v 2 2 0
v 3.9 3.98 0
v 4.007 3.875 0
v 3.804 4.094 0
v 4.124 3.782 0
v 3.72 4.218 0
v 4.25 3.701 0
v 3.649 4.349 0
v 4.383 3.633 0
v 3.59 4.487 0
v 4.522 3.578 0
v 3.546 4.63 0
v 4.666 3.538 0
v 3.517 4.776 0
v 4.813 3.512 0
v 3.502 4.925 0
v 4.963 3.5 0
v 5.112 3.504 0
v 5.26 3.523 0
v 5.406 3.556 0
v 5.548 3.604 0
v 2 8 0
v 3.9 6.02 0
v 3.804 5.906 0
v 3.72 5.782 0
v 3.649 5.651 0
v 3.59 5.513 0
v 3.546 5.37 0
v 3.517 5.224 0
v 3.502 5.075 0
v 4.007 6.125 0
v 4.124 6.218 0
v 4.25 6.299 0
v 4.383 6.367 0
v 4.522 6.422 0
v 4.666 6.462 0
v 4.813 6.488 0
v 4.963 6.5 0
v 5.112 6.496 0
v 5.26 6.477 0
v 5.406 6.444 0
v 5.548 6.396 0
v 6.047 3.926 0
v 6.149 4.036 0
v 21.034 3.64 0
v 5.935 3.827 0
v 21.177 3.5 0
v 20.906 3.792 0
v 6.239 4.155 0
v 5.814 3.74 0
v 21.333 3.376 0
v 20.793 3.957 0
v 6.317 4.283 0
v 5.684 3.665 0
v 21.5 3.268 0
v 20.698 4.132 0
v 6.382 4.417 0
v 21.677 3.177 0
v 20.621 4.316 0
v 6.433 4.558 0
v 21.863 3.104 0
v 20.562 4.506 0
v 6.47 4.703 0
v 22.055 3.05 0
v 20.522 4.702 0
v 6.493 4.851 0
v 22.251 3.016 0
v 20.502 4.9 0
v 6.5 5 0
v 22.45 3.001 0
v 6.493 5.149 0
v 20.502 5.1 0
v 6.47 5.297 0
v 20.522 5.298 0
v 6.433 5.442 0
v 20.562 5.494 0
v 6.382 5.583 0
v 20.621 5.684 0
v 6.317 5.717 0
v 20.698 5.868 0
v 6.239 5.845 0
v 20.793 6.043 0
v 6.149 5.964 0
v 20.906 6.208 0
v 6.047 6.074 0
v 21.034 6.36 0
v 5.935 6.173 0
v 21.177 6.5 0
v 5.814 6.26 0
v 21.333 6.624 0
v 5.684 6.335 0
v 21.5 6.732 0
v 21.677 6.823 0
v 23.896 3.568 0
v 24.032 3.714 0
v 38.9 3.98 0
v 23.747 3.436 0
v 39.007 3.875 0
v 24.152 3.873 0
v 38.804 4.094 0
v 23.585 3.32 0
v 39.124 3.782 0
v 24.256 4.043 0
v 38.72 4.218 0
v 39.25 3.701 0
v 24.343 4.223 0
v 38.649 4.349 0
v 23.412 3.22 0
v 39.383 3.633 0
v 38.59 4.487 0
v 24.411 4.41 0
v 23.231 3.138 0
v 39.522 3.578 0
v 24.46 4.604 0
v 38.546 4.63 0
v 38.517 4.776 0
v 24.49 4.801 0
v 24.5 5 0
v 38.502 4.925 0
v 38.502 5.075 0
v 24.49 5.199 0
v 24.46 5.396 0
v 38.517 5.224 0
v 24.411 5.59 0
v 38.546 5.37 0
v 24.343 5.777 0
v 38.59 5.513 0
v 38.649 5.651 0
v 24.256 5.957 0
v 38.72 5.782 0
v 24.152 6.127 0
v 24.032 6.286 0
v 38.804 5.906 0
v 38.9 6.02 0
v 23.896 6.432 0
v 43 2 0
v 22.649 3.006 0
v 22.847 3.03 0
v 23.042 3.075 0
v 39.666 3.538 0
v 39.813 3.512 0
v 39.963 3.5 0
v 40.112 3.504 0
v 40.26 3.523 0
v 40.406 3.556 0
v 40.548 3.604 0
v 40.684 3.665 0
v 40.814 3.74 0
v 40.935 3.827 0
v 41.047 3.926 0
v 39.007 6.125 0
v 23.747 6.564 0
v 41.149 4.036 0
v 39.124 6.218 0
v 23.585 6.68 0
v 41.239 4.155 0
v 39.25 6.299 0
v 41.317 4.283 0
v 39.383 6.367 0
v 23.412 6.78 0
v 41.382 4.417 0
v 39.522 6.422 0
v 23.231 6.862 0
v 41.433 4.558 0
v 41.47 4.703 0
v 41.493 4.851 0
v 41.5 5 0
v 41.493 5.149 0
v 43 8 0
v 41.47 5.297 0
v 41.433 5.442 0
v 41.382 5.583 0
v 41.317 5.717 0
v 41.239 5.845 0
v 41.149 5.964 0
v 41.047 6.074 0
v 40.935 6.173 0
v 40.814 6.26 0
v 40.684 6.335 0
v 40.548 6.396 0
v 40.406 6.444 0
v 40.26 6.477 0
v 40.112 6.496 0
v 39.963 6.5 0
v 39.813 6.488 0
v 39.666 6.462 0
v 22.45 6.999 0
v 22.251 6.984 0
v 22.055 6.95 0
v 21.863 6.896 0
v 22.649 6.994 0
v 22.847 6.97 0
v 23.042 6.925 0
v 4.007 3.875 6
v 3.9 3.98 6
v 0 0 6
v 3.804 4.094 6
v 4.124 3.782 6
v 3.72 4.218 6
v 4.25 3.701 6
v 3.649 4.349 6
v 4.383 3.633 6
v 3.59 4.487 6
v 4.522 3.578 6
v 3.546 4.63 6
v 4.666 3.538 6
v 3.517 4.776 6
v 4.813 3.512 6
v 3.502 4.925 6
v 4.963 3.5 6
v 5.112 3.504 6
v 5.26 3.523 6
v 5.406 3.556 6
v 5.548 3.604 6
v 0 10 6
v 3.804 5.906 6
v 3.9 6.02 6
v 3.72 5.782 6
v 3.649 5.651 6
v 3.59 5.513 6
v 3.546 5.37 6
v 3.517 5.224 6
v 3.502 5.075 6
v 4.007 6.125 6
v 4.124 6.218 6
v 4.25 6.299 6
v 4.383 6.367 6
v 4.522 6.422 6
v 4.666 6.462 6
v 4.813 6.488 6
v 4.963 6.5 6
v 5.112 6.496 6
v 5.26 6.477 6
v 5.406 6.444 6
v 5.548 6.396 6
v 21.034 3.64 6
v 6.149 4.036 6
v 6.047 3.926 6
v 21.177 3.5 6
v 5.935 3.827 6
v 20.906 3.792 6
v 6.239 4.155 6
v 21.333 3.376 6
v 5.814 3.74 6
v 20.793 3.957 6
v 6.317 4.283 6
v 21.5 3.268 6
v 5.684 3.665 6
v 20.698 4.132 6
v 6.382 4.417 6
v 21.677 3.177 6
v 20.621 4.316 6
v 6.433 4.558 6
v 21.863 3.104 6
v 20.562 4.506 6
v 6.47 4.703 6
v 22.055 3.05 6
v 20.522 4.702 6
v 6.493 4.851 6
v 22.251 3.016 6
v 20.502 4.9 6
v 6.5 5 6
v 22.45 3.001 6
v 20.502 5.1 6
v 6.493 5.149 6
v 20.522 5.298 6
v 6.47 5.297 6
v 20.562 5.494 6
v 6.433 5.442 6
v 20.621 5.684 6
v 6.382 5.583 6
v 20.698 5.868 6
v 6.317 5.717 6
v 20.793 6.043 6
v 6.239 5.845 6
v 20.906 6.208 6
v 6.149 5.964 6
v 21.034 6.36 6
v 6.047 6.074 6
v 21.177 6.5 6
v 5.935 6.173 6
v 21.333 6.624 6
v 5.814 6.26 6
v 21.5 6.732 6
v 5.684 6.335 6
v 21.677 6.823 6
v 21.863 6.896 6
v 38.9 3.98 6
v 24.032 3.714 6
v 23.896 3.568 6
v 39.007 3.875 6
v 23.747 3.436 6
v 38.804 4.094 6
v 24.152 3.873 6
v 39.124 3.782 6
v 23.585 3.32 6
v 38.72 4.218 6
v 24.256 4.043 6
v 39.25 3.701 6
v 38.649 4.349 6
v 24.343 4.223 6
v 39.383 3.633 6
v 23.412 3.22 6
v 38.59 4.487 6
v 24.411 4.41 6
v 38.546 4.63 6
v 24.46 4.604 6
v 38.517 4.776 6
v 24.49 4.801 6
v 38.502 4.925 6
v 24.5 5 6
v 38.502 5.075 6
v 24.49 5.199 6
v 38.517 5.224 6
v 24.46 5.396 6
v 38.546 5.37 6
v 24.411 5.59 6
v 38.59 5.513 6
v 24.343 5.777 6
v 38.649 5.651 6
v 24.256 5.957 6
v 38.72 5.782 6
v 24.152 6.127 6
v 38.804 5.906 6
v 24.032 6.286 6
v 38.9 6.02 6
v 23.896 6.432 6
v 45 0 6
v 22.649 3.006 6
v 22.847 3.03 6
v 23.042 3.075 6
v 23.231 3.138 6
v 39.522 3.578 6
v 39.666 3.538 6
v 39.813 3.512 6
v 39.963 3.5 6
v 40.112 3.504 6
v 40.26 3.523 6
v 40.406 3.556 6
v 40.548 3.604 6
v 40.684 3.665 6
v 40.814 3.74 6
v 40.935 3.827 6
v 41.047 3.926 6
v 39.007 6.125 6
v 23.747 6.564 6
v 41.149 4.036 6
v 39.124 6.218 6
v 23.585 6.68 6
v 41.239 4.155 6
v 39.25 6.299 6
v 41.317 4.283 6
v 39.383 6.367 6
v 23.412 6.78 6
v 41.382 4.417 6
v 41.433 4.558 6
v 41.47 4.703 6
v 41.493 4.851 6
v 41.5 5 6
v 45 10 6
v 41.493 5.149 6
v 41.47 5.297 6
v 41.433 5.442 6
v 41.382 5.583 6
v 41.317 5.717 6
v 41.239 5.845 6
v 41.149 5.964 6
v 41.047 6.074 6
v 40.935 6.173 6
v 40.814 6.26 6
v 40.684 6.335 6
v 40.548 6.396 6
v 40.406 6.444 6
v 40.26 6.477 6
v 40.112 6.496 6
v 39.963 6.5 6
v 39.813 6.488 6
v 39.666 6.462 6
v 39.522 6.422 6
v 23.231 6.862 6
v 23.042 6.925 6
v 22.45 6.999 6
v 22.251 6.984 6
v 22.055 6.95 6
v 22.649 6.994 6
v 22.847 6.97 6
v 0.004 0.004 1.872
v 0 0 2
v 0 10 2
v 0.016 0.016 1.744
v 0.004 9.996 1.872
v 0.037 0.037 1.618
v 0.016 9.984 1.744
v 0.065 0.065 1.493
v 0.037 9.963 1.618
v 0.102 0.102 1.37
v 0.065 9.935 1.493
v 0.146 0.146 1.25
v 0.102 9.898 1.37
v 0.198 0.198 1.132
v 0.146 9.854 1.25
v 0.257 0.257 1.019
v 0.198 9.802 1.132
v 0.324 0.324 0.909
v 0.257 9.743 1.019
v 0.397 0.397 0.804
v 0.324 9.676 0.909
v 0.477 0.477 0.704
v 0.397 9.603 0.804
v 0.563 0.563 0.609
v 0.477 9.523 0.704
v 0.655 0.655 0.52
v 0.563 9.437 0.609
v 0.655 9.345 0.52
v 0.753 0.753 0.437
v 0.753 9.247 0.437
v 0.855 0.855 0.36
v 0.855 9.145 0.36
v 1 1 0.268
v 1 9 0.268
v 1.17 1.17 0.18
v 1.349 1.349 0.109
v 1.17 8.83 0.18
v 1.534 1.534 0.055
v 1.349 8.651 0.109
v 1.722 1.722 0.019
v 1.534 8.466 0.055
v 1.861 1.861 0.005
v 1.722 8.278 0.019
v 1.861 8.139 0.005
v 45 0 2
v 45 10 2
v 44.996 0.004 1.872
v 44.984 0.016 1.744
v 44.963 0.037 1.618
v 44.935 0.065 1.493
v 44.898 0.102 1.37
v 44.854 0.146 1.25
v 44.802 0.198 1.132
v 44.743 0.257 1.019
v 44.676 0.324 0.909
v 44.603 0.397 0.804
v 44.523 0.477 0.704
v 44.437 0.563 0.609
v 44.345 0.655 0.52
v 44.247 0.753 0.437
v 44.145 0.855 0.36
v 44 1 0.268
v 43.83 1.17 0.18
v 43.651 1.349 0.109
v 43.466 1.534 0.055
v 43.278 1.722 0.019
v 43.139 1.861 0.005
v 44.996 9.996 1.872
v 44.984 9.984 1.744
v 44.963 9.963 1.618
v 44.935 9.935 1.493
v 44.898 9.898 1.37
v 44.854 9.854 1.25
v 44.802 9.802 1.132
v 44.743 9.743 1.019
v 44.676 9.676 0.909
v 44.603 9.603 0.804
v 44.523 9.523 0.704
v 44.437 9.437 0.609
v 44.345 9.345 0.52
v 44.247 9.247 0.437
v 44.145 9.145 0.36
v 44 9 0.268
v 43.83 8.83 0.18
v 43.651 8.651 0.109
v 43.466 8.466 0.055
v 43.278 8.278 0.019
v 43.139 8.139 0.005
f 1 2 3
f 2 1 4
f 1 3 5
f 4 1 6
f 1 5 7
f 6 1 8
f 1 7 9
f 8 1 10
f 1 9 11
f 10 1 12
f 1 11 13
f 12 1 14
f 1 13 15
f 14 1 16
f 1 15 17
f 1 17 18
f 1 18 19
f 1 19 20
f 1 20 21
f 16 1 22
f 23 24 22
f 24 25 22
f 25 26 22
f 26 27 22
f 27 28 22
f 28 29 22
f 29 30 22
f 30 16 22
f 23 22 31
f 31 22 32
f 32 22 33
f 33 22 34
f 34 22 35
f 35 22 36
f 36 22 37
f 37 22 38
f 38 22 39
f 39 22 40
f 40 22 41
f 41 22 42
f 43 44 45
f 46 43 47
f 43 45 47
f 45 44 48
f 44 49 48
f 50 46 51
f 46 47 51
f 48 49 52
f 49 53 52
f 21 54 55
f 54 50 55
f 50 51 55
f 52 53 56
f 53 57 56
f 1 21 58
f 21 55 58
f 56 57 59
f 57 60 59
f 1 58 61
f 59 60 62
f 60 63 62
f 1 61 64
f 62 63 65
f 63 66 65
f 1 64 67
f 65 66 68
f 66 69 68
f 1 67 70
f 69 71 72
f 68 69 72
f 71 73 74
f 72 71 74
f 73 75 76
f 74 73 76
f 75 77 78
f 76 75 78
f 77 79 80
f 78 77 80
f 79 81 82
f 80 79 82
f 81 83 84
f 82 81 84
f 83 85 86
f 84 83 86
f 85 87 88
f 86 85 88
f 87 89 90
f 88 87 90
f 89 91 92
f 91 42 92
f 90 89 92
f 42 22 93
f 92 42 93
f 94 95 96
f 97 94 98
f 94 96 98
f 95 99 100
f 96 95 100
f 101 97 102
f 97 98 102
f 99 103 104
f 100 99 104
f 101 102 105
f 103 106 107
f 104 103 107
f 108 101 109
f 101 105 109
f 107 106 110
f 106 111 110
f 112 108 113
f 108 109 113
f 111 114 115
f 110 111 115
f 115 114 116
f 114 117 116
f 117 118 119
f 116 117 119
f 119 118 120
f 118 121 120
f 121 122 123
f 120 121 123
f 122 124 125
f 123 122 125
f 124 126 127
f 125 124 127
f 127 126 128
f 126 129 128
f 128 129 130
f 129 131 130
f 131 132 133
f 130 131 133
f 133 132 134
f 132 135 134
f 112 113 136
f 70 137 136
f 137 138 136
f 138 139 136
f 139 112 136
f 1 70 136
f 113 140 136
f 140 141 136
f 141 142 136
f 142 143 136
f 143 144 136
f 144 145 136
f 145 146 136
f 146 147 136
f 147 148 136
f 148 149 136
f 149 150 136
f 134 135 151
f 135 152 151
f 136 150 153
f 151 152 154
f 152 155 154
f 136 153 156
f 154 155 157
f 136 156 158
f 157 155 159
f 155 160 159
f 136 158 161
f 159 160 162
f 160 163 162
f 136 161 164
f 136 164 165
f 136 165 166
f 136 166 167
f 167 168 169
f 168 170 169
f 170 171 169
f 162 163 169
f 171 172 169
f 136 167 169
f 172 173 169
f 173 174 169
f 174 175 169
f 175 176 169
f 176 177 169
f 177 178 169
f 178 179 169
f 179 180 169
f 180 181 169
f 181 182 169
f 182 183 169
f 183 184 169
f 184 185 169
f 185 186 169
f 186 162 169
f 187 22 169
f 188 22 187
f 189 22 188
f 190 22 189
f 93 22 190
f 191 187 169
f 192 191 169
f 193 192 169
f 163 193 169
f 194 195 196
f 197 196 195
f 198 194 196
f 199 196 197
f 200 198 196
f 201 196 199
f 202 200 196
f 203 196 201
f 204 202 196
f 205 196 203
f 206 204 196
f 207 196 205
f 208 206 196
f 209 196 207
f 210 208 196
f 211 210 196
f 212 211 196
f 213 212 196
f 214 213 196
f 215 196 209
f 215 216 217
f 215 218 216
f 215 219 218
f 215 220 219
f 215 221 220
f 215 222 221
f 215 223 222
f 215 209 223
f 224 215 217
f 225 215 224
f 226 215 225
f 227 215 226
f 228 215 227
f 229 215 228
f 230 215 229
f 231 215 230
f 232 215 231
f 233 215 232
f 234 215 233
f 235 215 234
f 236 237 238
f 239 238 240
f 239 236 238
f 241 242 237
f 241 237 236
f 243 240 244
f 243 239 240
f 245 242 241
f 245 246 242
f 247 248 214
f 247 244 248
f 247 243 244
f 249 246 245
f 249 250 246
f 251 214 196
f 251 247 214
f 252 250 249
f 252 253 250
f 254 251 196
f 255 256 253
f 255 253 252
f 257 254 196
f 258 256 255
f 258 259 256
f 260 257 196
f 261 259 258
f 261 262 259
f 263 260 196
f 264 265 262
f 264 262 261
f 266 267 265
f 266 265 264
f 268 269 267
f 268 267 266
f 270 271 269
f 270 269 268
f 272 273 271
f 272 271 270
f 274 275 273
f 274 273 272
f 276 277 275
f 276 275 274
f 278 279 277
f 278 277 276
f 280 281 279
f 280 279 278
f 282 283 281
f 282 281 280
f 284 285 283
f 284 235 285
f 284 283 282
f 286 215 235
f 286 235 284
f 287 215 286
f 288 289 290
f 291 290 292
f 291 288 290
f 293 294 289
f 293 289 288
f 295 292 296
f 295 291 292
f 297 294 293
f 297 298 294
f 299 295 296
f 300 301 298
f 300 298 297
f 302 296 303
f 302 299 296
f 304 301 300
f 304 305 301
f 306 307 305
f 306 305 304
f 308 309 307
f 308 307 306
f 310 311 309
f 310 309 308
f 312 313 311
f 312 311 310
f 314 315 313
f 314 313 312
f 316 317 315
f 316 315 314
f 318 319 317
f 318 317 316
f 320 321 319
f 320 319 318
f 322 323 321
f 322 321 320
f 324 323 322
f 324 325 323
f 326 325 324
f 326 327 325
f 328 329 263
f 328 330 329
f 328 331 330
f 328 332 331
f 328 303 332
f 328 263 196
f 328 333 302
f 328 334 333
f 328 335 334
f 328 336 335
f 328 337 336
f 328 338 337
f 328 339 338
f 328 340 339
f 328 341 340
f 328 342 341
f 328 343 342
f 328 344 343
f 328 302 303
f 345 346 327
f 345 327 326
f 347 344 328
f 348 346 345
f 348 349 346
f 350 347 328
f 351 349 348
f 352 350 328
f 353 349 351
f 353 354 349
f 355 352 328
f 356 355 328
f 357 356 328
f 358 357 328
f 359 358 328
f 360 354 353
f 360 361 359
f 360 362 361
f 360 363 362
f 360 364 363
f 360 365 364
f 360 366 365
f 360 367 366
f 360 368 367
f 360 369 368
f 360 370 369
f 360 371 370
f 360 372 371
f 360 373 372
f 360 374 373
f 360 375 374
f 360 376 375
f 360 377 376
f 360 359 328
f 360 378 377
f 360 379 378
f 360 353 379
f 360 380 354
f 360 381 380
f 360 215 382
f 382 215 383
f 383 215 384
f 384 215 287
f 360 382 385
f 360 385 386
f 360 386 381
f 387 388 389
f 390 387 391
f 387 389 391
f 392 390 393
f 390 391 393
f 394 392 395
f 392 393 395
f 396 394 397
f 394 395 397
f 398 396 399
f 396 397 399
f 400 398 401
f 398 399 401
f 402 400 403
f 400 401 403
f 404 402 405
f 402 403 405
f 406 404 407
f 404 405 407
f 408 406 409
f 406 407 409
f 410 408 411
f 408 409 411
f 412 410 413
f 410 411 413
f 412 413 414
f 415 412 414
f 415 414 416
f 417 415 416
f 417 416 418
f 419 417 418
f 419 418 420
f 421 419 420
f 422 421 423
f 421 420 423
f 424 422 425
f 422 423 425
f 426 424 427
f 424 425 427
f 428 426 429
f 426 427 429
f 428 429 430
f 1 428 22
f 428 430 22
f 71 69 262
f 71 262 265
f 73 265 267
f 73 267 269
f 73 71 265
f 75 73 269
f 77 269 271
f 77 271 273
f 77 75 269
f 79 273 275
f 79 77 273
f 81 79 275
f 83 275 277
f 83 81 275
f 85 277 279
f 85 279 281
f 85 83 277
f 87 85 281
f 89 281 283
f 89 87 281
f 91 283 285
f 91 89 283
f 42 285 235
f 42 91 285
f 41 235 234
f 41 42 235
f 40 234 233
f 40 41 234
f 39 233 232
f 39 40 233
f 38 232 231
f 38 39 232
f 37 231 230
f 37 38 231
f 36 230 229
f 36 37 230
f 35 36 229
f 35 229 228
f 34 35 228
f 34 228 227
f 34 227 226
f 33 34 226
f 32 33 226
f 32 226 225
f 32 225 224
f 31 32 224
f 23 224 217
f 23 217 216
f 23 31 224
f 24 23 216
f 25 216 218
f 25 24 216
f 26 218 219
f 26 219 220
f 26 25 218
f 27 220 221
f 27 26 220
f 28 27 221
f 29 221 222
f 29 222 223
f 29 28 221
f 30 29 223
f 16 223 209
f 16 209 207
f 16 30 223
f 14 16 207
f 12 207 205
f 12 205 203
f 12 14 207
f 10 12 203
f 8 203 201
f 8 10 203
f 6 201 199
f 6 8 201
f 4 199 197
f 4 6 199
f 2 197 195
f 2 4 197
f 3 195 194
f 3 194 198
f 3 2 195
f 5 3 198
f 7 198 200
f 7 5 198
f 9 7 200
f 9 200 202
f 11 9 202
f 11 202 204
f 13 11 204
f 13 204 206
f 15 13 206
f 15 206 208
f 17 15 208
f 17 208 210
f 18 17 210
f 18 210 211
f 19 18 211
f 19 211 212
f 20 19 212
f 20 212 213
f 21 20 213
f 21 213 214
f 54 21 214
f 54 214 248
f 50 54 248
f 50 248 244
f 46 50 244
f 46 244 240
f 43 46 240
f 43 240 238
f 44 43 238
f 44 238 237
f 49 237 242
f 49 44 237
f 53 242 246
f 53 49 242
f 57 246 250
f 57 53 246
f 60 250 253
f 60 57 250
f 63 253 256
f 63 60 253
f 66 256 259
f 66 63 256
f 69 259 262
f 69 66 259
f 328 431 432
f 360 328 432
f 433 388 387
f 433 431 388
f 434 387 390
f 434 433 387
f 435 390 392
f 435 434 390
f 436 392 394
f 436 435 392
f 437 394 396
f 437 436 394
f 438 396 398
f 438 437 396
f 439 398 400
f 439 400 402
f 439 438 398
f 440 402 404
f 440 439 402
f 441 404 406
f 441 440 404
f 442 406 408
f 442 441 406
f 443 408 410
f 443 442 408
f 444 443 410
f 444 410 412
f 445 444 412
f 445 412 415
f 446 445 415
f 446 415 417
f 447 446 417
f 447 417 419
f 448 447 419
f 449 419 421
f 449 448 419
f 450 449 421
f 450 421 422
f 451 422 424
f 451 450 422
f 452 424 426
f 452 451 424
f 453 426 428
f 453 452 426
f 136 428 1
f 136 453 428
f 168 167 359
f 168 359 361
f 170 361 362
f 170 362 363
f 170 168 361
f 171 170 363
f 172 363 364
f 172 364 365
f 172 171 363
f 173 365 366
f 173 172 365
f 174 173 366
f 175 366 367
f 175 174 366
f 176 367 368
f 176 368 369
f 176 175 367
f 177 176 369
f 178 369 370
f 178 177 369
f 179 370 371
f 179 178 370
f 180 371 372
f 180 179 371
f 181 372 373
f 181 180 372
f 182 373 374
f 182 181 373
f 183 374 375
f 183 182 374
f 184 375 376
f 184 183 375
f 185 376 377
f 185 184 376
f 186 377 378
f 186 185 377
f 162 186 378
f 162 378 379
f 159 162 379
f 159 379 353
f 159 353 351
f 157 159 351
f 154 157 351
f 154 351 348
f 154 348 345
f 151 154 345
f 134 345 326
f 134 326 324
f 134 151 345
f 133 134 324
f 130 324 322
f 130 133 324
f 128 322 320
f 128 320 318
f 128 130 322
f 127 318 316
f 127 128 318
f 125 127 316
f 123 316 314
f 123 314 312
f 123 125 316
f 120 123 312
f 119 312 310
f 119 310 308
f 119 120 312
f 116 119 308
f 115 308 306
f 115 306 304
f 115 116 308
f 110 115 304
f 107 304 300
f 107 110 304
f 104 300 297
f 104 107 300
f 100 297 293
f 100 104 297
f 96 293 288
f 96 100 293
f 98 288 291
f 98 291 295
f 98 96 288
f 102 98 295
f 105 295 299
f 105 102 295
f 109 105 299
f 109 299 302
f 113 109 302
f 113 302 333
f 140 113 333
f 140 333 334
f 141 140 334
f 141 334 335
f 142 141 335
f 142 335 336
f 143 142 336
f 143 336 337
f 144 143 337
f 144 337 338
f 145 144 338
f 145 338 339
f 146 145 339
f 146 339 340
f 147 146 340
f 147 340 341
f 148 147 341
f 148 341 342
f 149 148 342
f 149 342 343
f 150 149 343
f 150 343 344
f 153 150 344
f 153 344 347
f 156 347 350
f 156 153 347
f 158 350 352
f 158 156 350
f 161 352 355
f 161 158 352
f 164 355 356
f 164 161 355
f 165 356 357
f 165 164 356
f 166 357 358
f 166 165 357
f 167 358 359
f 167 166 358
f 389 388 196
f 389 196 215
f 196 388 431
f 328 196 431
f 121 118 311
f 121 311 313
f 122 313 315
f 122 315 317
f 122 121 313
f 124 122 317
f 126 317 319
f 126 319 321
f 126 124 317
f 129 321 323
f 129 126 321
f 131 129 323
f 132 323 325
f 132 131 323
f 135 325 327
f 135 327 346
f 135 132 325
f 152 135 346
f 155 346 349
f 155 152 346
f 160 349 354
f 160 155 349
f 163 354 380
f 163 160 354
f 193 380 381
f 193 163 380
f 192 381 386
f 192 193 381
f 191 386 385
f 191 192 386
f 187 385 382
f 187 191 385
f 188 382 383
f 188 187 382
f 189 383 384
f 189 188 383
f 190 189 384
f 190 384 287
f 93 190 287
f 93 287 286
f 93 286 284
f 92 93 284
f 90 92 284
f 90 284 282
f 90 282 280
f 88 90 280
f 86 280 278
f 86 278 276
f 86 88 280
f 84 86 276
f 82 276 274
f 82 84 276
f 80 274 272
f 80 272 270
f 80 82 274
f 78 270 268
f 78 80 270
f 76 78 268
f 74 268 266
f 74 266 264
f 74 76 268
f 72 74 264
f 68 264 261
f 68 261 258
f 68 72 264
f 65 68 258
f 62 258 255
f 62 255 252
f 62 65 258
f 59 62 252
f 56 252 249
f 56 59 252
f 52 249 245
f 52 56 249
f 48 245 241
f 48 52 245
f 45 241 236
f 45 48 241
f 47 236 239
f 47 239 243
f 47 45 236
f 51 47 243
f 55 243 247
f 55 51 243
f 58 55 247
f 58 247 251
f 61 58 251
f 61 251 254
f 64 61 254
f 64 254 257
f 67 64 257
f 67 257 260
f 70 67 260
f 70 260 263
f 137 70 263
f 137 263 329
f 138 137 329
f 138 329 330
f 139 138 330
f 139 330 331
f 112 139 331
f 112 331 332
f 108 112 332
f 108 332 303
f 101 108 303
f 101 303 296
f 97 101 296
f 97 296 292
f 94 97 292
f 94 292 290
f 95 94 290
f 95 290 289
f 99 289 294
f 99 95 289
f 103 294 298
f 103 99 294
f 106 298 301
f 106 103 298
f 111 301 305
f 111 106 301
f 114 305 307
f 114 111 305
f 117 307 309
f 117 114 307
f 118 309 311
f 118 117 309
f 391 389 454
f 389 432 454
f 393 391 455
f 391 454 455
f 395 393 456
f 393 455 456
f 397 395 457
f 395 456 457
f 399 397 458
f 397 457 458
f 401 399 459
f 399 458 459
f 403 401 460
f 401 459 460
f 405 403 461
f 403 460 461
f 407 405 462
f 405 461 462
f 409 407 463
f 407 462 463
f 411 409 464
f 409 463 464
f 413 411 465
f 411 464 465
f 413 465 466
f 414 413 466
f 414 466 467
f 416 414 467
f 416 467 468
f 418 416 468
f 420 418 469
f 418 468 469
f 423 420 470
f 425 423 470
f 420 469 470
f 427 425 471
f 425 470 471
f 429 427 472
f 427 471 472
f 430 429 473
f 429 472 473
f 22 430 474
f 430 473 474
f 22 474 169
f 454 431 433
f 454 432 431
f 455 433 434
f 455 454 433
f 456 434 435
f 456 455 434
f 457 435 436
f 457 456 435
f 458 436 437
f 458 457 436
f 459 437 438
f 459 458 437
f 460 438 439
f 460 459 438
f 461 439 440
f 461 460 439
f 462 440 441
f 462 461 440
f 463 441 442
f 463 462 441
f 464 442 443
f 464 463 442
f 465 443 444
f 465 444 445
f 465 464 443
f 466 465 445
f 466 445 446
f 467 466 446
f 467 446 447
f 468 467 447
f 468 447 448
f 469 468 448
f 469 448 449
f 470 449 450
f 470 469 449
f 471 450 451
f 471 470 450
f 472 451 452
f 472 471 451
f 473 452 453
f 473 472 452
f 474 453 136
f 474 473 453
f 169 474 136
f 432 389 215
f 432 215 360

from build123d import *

# Parameters (mm, degrees)
ESQUISSE1_W        = 45
ESQUISSE1_H        = 10
ESQUISSE1_R        = 1.5
ESQUISSE1_R_2      = 2
BOSS_EXTRU_1_DEPTH = 6
CONG_1_R           = 2


with BuildPart() as part:
    # Esquisse1 → Boss.-Extru.1 (new body)
    with BuildSketch(Plane.XY):
        with Locations((22.5, 5)):
            Rectangle(ESQUISSE1_W, ESQUISSE1_H)
        with Locations((5, 5)):
            Circle(ESQUISSE1_R, mode=Mode.SUBTRACT)
        with Locations((22.5, 5)):
            Circle(ESQUISSE1_R_2, mode=Mode.SUBTRACT)
        with Locations((40, 5)):
            Circle(ESQUISSE1_R, mode=Mode.SUBTRACT)
    extrude(amount=BOSS_EXTRU_1_DEPTH)

    # Congé1
    cong_1_edges = [part.edges().sort_by_distance(p)[0] for p in [
        (22.5, 10, 0),
        (45, 5, 0),
        (22.5, 0, 0),
        (0, 5, 0),
    ]]
    fillet(cong_1_edges, radius=CONG_1_R)


solid = part.part
